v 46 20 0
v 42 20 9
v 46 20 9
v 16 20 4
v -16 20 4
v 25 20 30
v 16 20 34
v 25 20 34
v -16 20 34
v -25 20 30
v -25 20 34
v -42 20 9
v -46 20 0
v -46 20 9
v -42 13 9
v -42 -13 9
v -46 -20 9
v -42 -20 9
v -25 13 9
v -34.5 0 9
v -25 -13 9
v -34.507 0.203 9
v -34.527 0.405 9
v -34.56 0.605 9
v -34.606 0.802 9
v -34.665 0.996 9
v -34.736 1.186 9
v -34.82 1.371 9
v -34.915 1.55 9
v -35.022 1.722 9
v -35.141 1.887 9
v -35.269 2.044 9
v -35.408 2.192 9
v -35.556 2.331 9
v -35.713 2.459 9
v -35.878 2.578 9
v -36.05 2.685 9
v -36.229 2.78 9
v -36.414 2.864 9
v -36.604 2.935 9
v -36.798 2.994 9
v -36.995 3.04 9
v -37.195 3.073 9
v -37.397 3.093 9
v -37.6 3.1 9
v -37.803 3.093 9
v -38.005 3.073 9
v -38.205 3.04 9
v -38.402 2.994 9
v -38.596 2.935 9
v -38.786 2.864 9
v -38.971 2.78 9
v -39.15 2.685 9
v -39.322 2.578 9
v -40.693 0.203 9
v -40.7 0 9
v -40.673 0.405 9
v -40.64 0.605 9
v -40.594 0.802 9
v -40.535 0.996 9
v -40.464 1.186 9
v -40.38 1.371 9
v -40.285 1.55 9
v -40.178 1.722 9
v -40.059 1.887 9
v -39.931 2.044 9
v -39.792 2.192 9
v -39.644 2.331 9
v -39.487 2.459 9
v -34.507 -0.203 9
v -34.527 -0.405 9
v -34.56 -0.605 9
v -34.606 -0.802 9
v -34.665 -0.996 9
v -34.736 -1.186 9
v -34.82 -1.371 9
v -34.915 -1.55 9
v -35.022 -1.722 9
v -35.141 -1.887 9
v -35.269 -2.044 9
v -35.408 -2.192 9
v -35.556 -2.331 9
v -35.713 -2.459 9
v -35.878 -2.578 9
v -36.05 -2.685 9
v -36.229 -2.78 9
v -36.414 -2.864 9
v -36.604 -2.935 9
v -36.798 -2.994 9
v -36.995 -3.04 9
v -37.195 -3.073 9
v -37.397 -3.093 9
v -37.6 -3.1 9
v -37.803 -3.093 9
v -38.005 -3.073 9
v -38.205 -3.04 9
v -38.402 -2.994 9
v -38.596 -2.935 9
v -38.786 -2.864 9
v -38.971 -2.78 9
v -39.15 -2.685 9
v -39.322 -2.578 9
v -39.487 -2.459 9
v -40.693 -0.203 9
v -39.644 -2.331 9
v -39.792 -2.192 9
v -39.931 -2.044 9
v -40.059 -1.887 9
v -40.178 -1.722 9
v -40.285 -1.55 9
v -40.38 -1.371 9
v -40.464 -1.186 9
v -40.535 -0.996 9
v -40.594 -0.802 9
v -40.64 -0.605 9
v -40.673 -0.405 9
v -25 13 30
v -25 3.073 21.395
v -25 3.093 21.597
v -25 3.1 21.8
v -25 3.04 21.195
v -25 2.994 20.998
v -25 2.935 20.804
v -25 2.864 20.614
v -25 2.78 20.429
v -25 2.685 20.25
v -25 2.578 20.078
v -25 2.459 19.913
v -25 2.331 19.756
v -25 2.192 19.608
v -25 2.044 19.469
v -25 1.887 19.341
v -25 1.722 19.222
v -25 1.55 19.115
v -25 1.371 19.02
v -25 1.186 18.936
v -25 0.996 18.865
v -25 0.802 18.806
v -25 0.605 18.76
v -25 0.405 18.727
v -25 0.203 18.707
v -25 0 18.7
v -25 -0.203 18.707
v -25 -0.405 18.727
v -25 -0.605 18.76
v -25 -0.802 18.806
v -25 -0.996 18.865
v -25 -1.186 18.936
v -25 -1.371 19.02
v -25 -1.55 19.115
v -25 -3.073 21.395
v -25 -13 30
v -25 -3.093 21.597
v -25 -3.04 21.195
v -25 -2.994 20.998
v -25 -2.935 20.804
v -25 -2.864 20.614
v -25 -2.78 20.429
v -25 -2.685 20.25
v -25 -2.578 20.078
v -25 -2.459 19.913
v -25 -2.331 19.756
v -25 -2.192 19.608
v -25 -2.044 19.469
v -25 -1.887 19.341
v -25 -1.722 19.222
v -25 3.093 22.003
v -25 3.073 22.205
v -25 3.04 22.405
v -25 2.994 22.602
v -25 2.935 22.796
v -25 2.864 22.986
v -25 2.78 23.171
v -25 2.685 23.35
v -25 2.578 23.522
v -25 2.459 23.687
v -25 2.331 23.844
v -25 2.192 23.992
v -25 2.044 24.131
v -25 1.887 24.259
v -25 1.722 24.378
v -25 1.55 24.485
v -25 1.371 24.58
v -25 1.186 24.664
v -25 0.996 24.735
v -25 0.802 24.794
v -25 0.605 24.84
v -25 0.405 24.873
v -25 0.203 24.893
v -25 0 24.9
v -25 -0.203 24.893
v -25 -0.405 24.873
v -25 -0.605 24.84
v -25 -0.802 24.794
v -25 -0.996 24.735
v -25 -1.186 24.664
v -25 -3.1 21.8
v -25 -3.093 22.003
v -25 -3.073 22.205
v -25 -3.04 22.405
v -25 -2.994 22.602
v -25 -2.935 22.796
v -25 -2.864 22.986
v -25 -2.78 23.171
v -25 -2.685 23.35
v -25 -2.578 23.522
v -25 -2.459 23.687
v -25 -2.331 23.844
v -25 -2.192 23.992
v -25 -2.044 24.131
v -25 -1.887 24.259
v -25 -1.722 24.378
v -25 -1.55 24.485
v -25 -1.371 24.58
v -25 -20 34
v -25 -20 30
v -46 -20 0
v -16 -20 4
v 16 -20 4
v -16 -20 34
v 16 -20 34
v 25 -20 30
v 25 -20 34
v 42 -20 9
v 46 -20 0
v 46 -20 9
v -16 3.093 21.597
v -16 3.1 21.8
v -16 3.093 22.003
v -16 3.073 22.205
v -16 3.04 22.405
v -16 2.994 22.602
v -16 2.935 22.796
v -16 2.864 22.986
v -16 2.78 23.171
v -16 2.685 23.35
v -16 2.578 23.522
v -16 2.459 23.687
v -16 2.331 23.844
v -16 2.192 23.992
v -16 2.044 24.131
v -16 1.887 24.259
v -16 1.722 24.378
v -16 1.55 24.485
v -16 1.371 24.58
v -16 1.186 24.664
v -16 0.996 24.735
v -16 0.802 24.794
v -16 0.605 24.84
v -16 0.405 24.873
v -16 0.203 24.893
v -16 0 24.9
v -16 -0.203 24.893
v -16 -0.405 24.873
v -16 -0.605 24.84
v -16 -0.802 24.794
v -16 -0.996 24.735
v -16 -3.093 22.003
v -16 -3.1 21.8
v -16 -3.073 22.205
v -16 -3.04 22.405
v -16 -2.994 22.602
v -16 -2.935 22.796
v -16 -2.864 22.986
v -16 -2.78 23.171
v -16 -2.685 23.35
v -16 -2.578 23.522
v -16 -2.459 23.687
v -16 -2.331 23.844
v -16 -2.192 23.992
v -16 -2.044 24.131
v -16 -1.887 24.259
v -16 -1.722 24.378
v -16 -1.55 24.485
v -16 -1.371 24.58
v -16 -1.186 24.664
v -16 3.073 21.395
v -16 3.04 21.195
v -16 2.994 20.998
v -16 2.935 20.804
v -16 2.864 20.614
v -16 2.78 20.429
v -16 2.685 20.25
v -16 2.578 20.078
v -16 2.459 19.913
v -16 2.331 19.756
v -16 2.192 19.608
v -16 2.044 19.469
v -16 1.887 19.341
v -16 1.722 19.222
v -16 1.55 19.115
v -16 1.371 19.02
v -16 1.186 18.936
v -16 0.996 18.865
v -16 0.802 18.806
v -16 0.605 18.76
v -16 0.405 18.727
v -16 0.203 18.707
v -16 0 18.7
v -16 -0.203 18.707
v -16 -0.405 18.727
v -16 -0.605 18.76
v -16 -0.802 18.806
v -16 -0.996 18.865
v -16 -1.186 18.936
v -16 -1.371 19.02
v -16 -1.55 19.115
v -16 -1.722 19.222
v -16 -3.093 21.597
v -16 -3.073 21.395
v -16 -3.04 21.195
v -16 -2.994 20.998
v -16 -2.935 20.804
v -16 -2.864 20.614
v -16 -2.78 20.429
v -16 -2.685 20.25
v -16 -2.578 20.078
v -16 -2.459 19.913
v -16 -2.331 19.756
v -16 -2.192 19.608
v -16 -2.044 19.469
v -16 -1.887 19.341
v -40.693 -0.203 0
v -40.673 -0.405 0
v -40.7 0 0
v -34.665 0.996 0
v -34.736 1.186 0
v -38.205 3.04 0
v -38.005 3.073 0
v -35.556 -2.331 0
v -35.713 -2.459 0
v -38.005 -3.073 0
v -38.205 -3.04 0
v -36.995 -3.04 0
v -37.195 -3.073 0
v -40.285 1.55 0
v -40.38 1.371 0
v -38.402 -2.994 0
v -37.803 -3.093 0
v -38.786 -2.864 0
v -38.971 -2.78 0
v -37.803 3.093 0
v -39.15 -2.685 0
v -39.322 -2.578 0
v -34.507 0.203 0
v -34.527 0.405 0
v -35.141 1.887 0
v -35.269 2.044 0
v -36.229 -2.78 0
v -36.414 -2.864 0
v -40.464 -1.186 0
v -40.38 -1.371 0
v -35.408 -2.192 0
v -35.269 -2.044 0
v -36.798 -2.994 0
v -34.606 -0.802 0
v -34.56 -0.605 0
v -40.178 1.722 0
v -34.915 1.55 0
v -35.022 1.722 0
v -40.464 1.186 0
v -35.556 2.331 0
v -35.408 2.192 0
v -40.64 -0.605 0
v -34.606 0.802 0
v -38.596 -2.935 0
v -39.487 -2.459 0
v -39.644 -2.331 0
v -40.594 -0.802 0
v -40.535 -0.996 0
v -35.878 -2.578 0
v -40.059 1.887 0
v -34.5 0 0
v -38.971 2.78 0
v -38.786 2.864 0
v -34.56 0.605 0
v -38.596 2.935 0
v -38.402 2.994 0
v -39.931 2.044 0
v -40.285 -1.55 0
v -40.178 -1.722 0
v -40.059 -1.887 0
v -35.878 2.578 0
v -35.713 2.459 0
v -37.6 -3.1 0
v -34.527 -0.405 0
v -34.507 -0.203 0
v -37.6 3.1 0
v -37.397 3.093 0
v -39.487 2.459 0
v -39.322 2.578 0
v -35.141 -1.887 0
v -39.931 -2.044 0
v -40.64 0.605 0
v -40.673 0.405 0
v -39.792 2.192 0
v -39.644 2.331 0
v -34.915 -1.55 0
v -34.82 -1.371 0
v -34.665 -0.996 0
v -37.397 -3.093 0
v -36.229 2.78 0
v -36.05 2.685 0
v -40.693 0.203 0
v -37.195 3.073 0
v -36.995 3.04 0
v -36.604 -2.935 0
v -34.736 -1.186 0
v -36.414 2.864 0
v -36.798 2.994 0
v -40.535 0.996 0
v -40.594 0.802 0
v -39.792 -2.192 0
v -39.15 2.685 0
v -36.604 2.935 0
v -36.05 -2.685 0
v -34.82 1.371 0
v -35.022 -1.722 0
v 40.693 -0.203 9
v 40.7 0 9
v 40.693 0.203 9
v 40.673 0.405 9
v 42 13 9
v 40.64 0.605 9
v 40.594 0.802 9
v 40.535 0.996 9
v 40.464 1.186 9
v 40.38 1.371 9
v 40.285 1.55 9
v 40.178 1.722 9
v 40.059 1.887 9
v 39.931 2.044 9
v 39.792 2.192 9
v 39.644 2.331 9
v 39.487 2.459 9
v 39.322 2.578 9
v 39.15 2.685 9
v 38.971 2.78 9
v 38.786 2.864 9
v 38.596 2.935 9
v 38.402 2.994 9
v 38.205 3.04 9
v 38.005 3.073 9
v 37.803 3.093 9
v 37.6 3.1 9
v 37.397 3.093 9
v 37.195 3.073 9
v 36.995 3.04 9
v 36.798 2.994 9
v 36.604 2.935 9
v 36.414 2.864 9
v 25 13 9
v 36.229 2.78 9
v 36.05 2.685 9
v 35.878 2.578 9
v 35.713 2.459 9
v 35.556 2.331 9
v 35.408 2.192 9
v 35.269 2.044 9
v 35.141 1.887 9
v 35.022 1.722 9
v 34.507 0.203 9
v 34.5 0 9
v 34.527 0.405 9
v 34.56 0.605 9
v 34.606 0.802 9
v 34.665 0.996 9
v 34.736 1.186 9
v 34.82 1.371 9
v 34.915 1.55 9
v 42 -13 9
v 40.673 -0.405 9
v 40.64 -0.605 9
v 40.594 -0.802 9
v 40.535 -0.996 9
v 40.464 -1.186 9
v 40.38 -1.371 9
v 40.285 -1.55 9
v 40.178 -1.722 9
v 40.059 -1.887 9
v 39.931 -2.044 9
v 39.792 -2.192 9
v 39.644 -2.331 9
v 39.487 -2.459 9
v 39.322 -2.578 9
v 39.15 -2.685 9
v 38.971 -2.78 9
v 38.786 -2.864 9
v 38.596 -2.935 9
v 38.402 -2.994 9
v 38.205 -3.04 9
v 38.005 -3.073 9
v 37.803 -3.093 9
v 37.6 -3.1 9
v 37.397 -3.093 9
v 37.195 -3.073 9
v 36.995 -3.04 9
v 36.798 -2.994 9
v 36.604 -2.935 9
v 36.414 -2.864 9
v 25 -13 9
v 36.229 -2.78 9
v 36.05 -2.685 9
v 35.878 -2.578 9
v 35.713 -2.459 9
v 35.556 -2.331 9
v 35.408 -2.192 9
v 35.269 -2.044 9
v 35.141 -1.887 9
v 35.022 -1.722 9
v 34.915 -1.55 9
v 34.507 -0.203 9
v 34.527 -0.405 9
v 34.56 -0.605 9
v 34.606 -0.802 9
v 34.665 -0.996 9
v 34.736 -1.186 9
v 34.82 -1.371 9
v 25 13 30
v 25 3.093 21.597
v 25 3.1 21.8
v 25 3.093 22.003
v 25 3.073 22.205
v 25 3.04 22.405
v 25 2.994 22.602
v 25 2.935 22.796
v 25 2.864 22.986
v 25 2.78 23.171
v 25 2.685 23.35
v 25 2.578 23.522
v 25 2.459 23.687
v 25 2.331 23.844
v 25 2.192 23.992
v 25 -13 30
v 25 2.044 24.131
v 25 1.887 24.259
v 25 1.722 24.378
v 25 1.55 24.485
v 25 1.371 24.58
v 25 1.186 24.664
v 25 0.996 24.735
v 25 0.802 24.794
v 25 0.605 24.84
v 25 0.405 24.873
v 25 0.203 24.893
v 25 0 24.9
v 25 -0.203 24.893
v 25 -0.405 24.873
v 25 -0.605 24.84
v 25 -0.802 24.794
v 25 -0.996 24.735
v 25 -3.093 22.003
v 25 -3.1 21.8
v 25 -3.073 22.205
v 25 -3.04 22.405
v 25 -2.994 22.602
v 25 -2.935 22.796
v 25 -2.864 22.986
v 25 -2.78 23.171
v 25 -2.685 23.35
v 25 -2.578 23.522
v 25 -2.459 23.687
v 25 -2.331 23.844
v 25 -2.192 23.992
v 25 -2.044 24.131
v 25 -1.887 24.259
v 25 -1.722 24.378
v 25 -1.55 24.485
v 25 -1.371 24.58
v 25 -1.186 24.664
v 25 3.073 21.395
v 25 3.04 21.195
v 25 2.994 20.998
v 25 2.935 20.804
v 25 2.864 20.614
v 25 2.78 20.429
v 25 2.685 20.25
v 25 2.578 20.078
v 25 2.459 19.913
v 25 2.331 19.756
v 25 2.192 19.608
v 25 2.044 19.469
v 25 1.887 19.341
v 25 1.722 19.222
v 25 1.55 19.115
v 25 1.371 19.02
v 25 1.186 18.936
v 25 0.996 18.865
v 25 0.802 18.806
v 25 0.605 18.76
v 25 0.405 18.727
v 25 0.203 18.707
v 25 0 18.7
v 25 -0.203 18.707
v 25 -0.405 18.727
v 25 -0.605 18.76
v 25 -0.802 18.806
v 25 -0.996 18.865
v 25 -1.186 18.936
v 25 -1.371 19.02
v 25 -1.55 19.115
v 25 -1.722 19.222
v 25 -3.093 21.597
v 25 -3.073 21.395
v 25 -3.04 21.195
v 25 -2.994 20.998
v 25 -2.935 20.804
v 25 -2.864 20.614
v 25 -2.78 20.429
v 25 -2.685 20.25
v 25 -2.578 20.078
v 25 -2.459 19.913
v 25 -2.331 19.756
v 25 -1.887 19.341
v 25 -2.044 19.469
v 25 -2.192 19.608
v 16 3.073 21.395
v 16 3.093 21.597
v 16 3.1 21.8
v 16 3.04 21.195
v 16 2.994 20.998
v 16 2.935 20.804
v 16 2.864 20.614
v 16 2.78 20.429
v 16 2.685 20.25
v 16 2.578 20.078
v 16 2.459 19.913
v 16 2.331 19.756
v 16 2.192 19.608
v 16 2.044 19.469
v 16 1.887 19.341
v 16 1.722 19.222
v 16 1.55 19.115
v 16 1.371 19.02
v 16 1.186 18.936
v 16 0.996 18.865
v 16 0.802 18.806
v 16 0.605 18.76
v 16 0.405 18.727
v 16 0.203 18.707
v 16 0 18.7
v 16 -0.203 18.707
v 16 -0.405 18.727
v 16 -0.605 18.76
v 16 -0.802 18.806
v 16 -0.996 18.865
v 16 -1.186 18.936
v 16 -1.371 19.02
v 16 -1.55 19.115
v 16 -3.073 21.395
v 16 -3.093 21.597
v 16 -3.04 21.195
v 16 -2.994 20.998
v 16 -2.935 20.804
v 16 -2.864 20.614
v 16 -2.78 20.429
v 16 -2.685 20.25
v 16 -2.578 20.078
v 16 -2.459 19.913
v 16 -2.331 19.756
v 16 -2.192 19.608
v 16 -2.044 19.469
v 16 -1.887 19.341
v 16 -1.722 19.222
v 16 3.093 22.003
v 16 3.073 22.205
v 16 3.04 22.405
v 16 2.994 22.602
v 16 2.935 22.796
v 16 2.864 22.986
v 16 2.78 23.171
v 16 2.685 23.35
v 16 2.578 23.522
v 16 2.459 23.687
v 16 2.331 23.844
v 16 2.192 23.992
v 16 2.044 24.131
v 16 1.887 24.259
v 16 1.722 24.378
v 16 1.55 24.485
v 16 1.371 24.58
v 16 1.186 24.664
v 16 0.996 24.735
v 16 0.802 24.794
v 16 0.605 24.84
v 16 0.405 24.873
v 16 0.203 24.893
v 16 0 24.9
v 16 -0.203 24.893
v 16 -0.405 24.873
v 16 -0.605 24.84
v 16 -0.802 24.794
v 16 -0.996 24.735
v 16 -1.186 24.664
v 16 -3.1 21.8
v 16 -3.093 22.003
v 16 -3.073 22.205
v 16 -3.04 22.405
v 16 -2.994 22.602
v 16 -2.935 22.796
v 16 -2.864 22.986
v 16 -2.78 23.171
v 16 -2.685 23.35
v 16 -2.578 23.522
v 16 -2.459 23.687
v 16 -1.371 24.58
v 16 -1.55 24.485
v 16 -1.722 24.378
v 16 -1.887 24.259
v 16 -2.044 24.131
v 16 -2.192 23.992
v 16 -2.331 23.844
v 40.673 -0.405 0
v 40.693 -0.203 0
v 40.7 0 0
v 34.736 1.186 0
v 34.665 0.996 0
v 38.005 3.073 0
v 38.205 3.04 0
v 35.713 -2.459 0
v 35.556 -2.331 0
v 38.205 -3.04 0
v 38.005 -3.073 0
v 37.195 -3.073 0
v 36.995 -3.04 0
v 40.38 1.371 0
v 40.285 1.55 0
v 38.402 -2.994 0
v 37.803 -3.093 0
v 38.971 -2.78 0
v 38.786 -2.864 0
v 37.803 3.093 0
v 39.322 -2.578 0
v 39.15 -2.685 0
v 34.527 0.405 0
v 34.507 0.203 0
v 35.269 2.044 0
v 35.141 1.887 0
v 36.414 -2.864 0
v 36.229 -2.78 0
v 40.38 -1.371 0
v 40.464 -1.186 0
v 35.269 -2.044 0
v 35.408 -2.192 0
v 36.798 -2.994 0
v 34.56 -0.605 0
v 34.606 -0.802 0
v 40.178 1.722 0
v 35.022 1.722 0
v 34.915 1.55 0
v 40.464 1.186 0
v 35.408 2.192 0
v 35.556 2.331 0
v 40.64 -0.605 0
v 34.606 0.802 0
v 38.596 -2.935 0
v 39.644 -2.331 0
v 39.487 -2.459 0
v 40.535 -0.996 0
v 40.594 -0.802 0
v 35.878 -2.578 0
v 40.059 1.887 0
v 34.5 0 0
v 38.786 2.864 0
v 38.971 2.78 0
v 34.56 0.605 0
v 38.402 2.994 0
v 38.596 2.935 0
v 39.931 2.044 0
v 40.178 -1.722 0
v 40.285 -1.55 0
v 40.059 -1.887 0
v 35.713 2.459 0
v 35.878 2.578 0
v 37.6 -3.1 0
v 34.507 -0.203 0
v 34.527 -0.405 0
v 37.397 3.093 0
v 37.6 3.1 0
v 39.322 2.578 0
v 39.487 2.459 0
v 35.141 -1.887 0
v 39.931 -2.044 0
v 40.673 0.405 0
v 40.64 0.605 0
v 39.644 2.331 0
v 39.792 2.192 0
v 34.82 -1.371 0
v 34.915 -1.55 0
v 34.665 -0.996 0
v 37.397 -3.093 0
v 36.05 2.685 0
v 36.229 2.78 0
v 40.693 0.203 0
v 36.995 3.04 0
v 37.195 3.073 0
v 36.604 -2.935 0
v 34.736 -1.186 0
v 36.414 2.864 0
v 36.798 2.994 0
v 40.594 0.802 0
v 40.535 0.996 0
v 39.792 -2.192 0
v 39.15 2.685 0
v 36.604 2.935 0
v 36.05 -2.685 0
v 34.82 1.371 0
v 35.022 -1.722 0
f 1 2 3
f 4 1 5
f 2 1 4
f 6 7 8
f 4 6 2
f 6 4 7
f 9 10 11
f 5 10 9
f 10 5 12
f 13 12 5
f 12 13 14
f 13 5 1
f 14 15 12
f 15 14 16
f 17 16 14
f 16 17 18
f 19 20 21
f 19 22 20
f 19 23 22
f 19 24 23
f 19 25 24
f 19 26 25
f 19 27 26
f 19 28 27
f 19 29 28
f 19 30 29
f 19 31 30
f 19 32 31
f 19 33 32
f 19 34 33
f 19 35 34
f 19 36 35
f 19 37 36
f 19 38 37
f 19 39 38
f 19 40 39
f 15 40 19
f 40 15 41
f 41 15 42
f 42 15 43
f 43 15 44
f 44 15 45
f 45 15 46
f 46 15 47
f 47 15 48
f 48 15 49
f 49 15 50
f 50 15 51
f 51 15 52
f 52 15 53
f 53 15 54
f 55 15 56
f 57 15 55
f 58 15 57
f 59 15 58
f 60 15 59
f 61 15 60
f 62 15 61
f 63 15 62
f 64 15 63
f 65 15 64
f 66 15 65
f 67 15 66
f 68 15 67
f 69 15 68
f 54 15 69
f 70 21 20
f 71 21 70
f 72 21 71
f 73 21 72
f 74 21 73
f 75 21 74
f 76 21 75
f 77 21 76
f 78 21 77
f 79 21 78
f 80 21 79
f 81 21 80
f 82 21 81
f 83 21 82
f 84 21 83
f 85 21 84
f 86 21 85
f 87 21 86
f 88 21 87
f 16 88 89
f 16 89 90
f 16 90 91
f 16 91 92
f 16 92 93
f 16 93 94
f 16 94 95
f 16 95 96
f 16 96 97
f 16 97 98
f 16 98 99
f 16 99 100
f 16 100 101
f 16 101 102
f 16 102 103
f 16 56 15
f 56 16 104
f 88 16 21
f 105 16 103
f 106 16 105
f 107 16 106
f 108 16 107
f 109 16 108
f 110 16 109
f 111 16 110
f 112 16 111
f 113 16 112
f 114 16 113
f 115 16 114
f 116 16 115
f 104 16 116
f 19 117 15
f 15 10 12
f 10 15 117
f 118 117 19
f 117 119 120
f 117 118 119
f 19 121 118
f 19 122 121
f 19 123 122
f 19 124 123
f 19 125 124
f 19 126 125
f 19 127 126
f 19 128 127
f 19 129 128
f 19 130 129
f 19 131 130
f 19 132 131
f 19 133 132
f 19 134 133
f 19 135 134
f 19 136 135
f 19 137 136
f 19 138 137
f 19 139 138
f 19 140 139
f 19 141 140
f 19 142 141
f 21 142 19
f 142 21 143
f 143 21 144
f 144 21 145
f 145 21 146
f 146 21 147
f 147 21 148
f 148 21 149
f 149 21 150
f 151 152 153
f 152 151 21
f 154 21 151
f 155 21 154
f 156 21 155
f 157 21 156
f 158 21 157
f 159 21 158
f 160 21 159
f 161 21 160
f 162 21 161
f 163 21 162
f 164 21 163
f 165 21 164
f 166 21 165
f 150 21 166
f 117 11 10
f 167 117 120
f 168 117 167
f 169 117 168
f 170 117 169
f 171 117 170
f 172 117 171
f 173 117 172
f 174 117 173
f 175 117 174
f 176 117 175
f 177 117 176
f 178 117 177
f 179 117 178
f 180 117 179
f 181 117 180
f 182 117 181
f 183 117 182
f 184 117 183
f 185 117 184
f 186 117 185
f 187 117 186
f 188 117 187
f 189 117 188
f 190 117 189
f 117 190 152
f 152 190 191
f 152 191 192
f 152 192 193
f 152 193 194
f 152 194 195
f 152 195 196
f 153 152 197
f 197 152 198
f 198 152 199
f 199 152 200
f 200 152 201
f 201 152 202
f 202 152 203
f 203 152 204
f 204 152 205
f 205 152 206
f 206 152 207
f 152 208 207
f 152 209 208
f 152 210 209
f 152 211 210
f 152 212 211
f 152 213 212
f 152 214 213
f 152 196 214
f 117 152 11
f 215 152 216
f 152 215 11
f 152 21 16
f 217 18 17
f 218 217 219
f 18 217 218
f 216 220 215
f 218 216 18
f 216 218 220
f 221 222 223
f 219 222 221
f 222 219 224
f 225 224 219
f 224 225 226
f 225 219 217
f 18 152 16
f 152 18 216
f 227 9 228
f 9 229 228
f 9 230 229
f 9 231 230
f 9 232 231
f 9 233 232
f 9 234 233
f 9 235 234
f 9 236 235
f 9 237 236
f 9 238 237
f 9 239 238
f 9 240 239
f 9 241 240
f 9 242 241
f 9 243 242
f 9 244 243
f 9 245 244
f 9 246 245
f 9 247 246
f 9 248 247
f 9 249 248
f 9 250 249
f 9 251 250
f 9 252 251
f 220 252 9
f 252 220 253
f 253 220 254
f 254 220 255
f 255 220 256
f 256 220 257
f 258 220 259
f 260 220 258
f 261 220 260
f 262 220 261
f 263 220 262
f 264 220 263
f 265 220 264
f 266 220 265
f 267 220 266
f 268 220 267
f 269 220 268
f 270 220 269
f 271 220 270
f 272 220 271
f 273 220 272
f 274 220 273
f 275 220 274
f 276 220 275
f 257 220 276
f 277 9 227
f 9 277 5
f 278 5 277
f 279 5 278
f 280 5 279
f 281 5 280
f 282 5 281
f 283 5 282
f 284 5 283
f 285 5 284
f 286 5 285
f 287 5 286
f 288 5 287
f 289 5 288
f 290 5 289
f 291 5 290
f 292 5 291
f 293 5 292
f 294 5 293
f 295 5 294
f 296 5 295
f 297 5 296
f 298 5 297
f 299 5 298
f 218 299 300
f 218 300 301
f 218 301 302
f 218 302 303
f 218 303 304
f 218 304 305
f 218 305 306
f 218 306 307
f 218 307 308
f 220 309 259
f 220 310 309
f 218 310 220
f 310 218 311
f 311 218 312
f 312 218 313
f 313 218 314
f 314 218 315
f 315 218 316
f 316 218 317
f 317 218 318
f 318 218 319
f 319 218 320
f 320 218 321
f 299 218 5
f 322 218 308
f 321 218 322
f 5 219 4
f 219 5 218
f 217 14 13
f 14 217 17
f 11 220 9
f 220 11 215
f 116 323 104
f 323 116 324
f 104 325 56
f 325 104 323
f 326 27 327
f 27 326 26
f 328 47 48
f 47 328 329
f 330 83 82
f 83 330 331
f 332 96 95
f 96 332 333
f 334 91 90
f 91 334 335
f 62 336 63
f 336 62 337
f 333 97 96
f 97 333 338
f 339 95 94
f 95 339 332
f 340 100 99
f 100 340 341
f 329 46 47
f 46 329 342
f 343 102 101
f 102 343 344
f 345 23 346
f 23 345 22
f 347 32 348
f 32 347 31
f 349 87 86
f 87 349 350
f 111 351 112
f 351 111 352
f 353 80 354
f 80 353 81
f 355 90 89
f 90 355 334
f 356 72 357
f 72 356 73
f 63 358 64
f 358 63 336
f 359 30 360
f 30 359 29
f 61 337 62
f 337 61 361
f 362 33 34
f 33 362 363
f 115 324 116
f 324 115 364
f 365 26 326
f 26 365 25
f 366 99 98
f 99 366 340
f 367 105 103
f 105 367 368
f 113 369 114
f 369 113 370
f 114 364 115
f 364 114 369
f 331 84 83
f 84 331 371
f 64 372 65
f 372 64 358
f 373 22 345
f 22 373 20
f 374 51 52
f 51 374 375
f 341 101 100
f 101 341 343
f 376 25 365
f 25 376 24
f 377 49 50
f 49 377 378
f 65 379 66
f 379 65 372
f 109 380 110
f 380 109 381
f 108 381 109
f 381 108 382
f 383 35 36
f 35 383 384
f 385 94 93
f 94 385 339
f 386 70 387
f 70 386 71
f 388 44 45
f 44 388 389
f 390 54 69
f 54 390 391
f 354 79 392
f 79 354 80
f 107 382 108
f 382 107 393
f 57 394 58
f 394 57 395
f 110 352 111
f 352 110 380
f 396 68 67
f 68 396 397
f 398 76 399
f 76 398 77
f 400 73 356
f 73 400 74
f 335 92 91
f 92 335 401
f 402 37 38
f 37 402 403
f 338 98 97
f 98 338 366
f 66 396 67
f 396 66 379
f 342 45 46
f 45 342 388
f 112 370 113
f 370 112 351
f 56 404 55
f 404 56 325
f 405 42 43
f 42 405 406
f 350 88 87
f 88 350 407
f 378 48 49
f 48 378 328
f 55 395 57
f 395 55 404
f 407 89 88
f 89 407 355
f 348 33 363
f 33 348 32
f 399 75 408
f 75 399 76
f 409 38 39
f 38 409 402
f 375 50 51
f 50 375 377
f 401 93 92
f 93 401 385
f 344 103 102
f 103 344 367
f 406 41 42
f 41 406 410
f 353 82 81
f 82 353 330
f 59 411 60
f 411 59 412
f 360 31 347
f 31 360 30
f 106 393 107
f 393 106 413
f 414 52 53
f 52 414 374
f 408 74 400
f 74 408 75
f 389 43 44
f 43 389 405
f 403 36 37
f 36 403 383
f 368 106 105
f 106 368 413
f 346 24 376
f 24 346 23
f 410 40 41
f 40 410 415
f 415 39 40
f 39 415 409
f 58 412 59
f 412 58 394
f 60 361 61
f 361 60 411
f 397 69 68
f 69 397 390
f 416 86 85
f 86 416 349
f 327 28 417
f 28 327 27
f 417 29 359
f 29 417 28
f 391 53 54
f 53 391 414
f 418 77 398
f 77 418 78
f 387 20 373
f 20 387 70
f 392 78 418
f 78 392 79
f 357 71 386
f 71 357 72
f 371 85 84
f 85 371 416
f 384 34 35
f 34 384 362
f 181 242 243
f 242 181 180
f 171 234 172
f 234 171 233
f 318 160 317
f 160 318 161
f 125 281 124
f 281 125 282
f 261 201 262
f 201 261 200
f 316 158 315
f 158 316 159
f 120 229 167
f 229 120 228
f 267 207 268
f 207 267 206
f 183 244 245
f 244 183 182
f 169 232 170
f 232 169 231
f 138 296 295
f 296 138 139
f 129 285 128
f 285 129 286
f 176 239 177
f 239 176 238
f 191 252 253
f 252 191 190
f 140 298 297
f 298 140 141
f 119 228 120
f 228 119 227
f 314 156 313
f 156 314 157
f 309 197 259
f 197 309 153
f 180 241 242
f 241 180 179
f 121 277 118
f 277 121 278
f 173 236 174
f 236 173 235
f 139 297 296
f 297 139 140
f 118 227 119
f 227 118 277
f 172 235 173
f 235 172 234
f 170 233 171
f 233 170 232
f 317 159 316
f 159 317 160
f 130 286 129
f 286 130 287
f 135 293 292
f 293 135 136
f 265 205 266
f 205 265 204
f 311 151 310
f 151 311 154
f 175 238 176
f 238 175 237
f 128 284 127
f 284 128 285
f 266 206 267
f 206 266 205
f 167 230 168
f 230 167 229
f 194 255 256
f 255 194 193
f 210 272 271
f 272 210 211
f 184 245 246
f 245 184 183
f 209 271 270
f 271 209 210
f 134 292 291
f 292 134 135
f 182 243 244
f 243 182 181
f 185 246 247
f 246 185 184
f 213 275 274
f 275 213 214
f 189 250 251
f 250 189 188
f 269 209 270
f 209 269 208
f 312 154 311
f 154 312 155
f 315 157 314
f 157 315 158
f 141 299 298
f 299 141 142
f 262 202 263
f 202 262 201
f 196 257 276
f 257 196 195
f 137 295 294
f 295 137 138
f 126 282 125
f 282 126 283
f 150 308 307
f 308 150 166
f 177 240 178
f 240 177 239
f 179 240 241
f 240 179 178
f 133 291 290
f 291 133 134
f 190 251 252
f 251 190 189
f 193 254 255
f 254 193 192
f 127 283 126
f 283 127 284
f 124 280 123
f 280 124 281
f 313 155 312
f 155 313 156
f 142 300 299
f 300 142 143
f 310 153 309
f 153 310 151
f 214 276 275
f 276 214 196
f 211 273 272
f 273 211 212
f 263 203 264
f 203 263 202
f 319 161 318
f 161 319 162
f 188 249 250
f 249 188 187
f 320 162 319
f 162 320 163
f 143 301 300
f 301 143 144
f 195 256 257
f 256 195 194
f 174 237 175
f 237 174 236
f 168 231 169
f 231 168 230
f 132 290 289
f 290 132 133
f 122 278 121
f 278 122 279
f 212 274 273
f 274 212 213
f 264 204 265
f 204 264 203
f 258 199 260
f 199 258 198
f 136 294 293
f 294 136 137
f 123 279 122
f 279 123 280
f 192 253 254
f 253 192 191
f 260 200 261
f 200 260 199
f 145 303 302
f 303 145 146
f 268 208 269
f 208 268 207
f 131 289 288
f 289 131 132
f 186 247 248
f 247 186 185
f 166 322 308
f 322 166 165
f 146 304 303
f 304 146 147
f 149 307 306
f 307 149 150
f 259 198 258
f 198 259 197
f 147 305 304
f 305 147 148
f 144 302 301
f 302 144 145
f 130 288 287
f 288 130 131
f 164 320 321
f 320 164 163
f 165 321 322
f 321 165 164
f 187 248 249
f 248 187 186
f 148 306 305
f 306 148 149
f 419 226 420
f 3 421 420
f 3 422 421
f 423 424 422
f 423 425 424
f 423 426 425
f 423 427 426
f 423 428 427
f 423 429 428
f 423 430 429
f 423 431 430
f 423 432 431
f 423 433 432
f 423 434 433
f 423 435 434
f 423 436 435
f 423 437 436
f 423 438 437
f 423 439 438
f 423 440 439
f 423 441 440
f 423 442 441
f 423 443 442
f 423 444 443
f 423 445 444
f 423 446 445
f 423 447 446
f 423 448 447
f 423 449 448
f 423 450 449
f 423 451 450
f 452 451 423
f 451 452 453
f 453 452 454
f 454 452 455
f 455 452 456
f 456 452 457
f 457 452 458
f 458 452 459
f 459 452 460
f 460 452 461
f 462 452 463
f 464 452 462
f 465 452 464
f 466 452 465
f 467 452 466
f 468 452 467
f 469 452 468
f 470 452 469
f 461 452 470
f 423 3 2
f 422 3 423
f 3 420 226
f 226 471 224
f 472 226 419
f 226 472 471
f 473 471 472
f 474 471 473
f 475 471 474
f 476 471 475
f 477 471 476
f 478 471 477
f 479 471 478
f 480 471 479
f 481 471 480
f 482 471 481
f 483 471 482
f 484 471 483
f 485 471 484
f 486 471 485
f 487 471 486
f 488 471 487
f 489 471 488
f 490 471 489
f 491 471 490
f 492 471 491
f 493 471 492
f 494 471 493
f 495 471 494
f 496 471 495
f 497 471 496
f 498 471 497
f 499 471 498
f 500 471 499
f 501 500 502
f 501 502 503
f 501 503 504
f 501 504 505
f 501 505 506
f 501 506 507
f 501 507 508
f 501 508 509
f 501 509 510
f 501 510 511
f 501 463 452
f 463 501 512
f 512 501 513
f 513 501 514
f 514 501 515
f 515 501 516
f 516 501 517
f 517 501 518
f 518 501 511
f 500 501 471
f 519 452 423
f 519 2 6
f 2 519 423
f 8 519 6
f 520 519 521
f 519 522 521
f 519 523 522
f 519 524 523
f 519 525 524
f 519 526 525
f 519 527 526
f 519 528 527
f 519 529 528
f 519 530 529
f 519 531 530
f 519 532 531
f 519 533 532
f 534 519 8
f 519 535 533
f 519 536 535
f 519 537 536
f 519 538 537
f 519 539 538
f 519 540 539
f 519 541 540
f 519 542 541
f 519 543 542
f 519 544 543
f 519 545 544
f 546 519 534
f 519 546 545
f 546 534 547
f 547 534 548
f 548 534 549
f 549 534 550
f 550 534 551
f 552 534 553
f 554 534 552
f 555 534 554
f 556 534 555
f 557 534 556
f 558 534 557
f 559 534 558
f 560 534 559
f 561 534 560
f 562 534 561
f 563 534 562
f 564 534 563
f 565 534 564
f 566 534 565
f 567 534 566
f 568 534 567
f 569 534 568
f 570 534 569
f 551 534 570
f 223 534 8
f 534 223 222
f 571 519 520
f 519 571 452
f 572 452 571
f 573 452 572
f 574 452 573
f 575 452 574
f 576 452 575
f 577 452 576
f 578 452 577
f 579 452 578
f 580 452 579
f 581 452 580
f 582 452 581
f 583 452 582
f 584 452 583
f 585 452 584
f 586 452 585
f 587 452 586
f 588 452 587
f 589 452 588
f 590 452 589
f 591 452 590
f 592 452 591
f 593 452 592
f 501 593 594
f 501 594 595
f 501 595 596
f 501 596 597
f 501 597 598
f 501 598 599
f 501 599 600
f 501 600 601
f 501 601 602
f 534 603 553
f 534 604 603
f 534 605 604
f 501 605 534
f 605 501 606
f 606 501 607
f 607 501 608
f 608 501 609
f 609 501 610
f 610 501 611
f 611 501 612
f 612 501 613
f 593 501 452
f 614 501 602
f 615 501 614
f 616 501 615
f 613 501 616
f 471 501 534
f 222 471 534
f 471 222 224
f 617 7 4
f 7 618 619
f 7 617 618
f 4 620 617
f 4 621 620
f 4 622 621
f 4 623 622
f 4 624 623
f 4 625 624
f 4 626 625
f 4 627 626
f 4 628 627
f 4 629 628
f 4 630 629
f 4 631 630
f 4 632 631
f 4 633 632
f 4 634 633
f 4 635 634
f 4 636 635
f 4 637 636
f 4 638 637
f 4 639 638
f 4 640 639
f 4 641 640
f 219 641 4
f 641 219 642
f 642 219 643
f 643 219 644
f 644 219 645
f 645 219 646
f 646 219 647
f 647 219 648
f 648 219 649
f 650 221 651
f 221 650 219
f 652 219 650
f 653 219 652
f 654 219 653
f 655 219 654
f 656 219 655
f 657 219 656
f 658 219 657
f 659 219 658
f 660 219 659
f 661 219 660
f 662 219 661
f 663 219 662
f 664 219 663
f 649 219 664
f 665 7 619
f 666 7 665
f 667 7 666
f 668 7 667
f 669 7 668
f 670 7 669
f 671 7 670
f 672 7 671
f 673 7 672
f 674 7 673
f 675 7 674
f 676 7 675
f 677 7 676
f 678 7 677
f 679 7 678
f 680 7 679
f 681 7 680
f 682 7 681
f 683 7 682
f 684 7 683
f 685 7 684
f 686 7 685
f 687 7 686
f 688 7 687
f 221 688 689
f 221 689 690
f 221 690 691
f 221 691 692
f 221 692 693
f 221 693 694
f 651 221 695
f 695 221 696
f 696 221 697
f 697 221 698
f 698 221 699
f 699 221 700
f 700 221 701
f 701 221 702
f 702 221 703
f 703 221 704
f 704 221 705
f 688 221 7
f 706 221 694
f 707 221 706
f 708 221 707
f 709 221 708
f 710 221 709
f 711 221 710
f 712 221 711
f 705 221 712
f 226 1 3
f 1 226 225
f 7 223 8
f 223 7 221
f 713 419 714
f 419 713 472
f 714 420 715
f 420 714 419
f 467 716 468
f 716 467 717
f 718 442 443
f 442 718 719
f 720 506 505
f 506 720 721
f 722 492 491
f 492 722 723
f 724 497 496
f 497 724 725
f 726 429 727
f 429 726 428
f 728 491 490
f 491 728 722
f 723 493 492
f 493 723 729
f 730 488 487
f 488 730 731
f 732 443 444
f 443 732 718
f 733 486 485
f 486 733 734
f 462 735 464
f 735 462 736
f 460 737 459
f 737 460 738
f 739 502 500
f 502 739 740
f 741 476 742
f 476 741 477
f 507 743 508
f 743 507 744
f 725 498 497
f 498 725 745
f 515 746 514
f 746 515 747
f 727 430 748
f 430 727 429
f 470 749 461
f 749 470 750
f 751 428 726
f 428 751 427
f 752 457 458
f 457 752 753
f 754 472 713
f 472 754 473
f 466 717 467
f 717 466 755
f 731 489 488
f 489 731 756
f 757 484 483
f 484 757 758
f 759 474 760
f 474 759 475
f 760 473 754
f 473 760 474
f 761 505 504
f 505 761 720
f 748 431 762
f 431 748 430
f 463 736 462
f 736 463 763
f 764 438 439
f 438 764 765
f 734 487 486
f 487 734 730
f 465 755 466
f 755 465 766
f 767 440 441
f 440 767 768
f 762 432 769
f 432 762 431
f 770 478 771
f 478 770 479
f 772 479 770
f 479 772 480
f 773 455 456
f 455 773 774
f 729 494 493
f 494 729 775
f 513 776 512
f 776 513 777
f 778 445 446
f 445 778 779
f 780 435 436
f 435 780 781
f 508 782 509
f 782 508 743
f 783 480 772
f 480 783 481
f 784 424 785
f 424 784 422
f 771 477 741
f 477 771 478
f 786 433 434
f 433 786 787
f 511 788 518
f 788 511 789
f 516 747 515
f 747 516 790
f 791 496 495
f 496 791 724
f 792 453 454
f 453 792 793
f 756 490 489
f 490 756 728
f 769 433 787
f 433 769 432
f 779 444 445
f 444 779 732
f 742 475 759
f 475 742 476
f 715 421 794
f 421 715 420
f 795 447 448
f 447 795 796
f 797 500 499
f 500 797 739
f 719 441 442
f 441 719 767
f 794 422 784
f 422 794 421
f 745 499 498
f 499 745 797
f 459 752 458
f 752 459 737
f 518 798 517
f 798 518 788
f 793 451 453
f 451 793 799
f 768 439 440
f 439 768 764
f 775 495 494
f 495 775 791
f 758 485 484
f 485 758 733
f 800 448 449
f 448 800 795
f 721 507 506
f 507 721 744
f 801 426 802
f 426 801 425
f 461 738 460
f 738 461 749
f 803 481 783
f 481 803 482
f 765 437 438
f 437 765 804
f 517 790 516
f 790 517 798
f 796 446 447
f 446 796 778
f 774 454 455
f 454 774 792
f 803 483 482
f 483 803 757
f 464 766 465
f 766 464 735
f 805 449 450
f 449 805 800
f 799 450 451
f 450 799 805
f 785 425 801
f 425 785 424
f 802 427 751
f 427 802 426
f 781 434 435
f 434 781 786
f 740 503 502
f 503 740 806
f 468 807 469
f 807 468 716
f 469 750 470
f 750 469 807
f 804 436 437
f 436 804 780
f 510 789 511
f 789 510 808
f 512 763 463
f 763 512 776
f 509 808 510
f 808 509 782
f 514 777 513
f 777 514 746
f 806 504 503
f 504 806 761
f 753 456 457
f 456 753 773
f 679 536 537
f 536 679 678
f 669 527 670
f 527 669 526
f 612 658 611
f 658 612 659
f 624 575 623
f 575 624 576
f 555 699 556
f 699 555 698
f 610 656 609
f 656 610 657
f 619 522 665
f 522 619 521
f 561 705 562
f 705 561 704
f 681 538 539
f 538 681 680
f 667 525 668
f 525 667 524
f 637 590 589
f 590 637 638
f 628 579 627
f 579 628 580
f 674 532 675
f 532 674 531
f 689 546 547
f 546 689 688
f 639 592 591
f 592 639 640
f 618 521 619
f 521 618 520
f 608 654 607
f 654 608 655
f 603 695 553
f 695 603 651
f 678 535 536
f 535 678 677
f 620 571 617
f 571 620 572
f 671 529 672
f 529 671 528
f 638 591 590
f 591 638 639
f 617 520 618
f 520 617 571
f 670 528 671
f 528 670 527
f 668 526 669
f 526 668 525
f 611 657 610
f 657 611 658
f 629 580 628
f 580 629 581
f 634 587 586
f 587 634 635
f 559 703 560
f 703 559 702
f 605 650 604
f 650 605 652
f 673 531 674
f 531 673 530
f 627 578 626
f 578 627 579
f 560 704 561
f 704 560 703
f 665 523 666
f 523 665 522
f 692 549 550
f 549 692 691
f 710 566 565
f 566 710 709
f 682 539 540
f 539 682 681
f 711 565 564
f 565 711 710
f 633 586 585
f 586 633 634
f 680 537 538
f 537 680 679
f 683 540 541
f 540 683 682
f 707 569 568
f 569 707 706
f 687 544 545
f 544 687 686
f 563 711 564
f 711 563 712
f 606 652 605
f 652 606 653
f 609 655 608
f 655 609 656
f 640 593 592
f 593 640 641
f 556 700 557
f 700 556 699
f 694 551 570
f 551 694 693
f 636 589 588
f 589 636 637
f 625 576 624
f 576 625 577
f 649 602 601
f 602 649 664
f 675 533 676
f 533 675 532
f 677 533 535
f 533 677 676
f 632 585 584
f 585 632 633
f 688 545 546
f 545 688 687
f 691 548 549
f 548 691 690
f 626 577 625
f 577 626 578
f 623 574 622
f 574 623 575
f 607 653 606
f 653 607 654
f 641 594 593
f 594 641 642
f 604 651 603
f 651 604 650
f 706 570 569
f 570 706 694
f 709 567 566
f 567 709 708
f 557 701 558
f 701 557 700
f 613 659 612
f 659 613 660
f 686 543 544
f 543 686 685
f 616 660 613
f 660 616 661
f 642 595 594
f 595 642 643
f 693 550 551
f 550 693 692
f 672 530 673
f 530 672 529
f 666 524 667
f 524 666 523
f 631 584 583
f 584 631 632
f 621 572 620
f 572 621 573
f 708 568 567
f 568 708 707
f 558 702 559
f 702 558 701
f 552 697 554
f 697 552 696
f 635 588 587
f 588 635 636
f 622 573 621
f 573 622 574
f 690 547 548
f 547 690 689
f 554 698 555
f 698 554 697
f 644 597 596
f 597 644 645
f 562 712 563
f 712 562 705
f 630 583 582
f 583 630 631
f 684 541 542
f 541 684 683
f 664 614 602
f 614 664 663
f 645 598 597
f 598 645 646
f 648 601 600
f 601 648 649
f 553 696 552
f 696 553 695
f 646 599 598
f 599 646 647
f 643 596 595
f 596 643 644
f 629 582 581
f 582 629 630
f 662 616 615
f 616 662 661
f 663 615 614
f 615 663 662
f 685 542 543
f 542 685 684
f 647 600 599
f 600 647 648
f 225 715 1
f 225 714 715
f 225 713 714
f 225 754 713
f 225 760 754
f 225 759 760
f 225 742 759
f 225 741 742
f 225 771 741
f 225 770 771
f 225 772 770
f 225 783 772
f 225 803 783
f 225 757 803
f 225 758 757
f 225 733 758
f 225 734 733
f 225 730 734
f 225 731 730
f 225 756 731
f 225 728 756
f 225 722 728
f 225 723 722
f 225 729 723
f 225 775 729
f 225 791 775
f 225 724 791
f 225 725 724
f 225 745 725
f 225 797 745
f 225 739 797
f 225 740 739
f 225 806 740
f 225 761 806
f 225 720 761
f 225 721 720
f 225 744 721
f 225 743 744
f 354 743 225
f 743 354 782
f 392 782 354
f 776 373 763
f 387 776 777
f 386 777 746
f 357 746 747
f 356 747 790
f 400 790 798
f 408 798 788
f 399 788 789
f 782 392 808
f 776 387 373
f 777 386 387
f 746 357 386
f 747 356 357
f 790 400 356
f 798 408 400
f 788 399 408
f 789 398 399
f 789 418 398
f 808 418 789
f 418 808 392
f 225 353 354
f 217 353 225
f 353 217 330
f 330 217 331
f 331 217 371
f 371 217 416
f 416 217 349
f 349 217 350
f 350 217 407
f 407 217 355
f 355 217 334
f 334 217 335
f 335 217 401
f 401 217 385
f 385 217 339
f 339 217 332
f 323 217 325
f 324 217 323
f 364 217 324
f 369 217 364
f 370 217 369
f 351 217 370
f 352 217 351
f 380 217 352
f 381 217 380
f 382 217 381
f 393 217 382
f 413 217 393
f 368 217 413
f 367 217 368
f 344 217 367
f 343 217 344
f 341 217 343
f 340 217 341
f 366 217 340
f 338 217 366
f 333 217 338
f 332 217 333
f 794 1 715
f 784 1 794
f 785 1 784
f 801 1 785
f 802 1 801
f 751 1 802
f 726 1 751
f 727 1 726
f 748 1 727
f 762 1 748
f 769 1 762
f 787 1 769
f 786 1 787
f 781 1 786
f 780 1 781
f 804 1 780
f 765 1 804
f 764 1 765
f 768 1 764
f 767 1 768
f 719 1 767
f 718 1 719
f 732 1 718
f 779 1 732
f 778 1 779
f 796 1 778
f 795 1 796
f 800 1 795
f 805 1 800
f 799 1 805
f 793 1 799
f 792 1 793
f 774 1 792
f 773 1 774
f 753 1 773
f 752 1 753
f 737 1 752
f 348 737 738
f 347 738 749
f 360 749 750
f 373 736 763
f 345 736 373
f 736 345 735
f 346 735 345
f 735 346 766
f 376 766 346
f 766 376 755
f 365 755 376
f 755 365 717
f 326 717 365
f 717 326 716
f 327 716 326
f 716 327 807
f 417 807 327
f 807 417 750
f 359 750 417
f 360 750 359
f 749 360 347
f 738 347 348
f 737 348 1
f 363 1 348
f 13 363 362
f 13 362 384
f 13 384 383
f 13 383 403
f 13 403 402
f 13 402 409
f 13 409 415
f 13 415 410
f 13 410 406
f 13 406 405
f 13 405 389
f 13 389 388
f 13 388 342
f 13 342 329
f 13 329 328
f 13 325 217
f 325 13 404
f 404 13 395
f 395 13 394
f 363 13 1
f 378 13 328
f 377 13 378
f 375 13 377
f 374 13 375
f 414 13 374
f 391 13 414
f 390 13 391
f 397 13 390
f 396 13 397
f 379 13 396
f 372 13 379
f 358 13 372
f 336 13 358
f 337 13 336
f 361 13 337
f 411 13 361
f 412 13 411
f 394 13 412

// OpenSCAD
// ============================================================
// Paired Reinforcement Bracket on ABS Substrate
//
// Two mirrored copies of a reinforcement bracket are mounted
// back-to-back on a shared flat substrate. The gap is measured
// as the clear distance between the inner upright faces.
//
// Standalone — no external dependencies.
//
// All units: millimeters.
// ============================================================

/* [Bracket Dimensions] */
leg_length              = 30;
face_width              = 40;
vertical_wall_thickness = 9;     // Thickness of the upright leg
bottom_thickness        = 5;     // Thickness of the horizontal leg (bottom part with holes)

/* [Bracing] */
gusset_band_width       = 7;
gusset_end_margin       = 4;

/* [Mounting Holes] */
bottom_hole_diameter    = 6.2;
vertical_hole_diameter  = 6.2;
bottom_hole_outboard_offset = 6.6;
vertical_hole_raise     = 2.8;

/* [Pair Layout] */
gap_between_brackets    = 32;    // Clear gap between inner upright faces

/* [Substrate] */
substrate_thickness     = 4;
substrate_end_margin    = 0;
substrate_side_margin   = 0;

/* [Quality] */
$fn                     = 96;
$fa                     = 2;
$fs                     = 0.4;

// ============================================================
// DERIVED
// ============================================================

half_face_width         = face_width / 2;
gusset_band             = min(gusset_band_width, face_width / 2 - 0.2);
gusset_center_offset    = half_face_width - gusset_band / 2;
substrate_length        = gap_between_brackets + 2 * leg_length + 2 * substrate_end_margin;
substrate_width         = face_width + 2 * substrate_side_margin;
bottom_hole_center_from_corner = leg_length / 2 + bottom_hole_outboard_offset;
vertical_hole_center_from_corner = leg_length / 2 + vertical_hole_raise;
substrate_hole_center_x = gap_between_brackets / 2 + bottom_hole_center_from_corner;

// ============================================================
// HELPERS
// ============================================================

module flat_rect_2d(w, h) {
    square([w, h], center = true);
}

module outer_gusset_profile() {
    polygon(points = [
        [vertical_wall_thickness, bottom_thickness],
        [leg_length - gusset_end_margin, bottom_thickness],
        [vertical_wall_thickness, leg_length - gusset_end_margin]
    ]);
}

// ============================================================
// SINGLE BRACKET GEOMETRY (standalone, no external dependencies)
// ============================================================

module horizontal_leg() {
    translate([leg_length / 2, bottom_thickness / 2, 0])
        rotate([90, 0, 0])
            linear_extrude(height = bottom_thickness, center = true)
                flat_rect_2d(leg_length, face_width);
}

module vertical_leg() {
    translate([vertical_wall_thickness / 2, leg_length / 2, 0])
        rotate([0, 90, 0])
            linear_extrude(height = vertical_wall_thickness, center = true)
                flat_rect_2d(face_width, leg_length);
}

module side_gussets() {
    for (side = [-1, 1])
        translate([0, 0, side * gusset_center_offset])
            linear_extrude(height = gusset_band, center = true)
                outer_gusset_profile();
}

module centered_holes(
    horizontal_hole_center_from_corner,
    vertical_hole_center_from_corner,
    horizontal_hole_diameter,
    vertical_hole_diameter
) {
    translate([horizontal_hole_center_from_corner, bottom_thickness / 2, 0])
        rotate([90, 0, 0])
            cylinder(h = bottom_thickness + 0.4, d = horizontal_hole_diameter, center = true);

    translate([vertical_wall_thickness / 2, vertical_hole_center_from_corner, 0])
        rotate([0, 90, 0])
            cylinder(h = vertical_wall_thickness + 0.4, d = vertical_hole_diameter, center = true);
}

module single_bracket(
    horizontal_hole_center_from_corner,
    vertical_hole_center_from_corner,
    horizontal_hole_diameter,
    vertical_hole_diameter
) {
    difference() {
        union() {
            horizontal_leg();
            vertical_leg();
            side_gussets();
        }
        centered_holes(
            horizontal_hole_center_from_corner = horizontal_hole_center_from_corner,
            vertical_hole_center_from_corner = vertical_hole_center_from_corner,
            horizontal_hole_diameter = horizontal_hole_diameter,
            vertical_hole_diameter = vertical_hole_diameter
        );
    }
}

// ============================================================
// PAIRED BRACKET GEOMETRY
// ============================================================

module substrate_plate() {
    translate([0, 0, substrate_thickness / 2])
        cube([substrate_length, substrate_width, substrate_thickness], center = true);
}

module upright_bracket() {
    rotate([90, 0, 0])
        single_bracket(
            horizontal_hole_center_from_corner = bottom_hole_center_from_corner,
            vertical_hole_center_from_corner = vertical_hole_center_from_corner,
            horizontal_hole_diameter = bottom_hole_diameter,
            vertical_hole_diameter = vertical_hole_diameter
        );
}

module left_bracket() {
    translate([-gap_between_brackets / 2, 0, substrate_thickness])
        mirror([1, 0, 0])
            upright_bracket();
}

module right_bracket() {
    translate([gap_between_brackets / 2, 0, substrate_thickness])
        upright_bracket();
}

module substrate_mount_holes() {
    for (side = [-1, 1])
        translate([side * substrate_hole_center_x, 0, substrate_thickness / 2])
            cylinder(h = substrate_thickness + 0.4, d = bottom_hole_diameter, center = true);
}

module paired_reinforcement_bracket() {
    difference() {
        union() {
            substrate_plate();
            left_bracket();
            right_bracket();
        }
        substrate_mount_holes();
    }
}

color("DarkOrange")
    paired_reinforcement_bracket();
